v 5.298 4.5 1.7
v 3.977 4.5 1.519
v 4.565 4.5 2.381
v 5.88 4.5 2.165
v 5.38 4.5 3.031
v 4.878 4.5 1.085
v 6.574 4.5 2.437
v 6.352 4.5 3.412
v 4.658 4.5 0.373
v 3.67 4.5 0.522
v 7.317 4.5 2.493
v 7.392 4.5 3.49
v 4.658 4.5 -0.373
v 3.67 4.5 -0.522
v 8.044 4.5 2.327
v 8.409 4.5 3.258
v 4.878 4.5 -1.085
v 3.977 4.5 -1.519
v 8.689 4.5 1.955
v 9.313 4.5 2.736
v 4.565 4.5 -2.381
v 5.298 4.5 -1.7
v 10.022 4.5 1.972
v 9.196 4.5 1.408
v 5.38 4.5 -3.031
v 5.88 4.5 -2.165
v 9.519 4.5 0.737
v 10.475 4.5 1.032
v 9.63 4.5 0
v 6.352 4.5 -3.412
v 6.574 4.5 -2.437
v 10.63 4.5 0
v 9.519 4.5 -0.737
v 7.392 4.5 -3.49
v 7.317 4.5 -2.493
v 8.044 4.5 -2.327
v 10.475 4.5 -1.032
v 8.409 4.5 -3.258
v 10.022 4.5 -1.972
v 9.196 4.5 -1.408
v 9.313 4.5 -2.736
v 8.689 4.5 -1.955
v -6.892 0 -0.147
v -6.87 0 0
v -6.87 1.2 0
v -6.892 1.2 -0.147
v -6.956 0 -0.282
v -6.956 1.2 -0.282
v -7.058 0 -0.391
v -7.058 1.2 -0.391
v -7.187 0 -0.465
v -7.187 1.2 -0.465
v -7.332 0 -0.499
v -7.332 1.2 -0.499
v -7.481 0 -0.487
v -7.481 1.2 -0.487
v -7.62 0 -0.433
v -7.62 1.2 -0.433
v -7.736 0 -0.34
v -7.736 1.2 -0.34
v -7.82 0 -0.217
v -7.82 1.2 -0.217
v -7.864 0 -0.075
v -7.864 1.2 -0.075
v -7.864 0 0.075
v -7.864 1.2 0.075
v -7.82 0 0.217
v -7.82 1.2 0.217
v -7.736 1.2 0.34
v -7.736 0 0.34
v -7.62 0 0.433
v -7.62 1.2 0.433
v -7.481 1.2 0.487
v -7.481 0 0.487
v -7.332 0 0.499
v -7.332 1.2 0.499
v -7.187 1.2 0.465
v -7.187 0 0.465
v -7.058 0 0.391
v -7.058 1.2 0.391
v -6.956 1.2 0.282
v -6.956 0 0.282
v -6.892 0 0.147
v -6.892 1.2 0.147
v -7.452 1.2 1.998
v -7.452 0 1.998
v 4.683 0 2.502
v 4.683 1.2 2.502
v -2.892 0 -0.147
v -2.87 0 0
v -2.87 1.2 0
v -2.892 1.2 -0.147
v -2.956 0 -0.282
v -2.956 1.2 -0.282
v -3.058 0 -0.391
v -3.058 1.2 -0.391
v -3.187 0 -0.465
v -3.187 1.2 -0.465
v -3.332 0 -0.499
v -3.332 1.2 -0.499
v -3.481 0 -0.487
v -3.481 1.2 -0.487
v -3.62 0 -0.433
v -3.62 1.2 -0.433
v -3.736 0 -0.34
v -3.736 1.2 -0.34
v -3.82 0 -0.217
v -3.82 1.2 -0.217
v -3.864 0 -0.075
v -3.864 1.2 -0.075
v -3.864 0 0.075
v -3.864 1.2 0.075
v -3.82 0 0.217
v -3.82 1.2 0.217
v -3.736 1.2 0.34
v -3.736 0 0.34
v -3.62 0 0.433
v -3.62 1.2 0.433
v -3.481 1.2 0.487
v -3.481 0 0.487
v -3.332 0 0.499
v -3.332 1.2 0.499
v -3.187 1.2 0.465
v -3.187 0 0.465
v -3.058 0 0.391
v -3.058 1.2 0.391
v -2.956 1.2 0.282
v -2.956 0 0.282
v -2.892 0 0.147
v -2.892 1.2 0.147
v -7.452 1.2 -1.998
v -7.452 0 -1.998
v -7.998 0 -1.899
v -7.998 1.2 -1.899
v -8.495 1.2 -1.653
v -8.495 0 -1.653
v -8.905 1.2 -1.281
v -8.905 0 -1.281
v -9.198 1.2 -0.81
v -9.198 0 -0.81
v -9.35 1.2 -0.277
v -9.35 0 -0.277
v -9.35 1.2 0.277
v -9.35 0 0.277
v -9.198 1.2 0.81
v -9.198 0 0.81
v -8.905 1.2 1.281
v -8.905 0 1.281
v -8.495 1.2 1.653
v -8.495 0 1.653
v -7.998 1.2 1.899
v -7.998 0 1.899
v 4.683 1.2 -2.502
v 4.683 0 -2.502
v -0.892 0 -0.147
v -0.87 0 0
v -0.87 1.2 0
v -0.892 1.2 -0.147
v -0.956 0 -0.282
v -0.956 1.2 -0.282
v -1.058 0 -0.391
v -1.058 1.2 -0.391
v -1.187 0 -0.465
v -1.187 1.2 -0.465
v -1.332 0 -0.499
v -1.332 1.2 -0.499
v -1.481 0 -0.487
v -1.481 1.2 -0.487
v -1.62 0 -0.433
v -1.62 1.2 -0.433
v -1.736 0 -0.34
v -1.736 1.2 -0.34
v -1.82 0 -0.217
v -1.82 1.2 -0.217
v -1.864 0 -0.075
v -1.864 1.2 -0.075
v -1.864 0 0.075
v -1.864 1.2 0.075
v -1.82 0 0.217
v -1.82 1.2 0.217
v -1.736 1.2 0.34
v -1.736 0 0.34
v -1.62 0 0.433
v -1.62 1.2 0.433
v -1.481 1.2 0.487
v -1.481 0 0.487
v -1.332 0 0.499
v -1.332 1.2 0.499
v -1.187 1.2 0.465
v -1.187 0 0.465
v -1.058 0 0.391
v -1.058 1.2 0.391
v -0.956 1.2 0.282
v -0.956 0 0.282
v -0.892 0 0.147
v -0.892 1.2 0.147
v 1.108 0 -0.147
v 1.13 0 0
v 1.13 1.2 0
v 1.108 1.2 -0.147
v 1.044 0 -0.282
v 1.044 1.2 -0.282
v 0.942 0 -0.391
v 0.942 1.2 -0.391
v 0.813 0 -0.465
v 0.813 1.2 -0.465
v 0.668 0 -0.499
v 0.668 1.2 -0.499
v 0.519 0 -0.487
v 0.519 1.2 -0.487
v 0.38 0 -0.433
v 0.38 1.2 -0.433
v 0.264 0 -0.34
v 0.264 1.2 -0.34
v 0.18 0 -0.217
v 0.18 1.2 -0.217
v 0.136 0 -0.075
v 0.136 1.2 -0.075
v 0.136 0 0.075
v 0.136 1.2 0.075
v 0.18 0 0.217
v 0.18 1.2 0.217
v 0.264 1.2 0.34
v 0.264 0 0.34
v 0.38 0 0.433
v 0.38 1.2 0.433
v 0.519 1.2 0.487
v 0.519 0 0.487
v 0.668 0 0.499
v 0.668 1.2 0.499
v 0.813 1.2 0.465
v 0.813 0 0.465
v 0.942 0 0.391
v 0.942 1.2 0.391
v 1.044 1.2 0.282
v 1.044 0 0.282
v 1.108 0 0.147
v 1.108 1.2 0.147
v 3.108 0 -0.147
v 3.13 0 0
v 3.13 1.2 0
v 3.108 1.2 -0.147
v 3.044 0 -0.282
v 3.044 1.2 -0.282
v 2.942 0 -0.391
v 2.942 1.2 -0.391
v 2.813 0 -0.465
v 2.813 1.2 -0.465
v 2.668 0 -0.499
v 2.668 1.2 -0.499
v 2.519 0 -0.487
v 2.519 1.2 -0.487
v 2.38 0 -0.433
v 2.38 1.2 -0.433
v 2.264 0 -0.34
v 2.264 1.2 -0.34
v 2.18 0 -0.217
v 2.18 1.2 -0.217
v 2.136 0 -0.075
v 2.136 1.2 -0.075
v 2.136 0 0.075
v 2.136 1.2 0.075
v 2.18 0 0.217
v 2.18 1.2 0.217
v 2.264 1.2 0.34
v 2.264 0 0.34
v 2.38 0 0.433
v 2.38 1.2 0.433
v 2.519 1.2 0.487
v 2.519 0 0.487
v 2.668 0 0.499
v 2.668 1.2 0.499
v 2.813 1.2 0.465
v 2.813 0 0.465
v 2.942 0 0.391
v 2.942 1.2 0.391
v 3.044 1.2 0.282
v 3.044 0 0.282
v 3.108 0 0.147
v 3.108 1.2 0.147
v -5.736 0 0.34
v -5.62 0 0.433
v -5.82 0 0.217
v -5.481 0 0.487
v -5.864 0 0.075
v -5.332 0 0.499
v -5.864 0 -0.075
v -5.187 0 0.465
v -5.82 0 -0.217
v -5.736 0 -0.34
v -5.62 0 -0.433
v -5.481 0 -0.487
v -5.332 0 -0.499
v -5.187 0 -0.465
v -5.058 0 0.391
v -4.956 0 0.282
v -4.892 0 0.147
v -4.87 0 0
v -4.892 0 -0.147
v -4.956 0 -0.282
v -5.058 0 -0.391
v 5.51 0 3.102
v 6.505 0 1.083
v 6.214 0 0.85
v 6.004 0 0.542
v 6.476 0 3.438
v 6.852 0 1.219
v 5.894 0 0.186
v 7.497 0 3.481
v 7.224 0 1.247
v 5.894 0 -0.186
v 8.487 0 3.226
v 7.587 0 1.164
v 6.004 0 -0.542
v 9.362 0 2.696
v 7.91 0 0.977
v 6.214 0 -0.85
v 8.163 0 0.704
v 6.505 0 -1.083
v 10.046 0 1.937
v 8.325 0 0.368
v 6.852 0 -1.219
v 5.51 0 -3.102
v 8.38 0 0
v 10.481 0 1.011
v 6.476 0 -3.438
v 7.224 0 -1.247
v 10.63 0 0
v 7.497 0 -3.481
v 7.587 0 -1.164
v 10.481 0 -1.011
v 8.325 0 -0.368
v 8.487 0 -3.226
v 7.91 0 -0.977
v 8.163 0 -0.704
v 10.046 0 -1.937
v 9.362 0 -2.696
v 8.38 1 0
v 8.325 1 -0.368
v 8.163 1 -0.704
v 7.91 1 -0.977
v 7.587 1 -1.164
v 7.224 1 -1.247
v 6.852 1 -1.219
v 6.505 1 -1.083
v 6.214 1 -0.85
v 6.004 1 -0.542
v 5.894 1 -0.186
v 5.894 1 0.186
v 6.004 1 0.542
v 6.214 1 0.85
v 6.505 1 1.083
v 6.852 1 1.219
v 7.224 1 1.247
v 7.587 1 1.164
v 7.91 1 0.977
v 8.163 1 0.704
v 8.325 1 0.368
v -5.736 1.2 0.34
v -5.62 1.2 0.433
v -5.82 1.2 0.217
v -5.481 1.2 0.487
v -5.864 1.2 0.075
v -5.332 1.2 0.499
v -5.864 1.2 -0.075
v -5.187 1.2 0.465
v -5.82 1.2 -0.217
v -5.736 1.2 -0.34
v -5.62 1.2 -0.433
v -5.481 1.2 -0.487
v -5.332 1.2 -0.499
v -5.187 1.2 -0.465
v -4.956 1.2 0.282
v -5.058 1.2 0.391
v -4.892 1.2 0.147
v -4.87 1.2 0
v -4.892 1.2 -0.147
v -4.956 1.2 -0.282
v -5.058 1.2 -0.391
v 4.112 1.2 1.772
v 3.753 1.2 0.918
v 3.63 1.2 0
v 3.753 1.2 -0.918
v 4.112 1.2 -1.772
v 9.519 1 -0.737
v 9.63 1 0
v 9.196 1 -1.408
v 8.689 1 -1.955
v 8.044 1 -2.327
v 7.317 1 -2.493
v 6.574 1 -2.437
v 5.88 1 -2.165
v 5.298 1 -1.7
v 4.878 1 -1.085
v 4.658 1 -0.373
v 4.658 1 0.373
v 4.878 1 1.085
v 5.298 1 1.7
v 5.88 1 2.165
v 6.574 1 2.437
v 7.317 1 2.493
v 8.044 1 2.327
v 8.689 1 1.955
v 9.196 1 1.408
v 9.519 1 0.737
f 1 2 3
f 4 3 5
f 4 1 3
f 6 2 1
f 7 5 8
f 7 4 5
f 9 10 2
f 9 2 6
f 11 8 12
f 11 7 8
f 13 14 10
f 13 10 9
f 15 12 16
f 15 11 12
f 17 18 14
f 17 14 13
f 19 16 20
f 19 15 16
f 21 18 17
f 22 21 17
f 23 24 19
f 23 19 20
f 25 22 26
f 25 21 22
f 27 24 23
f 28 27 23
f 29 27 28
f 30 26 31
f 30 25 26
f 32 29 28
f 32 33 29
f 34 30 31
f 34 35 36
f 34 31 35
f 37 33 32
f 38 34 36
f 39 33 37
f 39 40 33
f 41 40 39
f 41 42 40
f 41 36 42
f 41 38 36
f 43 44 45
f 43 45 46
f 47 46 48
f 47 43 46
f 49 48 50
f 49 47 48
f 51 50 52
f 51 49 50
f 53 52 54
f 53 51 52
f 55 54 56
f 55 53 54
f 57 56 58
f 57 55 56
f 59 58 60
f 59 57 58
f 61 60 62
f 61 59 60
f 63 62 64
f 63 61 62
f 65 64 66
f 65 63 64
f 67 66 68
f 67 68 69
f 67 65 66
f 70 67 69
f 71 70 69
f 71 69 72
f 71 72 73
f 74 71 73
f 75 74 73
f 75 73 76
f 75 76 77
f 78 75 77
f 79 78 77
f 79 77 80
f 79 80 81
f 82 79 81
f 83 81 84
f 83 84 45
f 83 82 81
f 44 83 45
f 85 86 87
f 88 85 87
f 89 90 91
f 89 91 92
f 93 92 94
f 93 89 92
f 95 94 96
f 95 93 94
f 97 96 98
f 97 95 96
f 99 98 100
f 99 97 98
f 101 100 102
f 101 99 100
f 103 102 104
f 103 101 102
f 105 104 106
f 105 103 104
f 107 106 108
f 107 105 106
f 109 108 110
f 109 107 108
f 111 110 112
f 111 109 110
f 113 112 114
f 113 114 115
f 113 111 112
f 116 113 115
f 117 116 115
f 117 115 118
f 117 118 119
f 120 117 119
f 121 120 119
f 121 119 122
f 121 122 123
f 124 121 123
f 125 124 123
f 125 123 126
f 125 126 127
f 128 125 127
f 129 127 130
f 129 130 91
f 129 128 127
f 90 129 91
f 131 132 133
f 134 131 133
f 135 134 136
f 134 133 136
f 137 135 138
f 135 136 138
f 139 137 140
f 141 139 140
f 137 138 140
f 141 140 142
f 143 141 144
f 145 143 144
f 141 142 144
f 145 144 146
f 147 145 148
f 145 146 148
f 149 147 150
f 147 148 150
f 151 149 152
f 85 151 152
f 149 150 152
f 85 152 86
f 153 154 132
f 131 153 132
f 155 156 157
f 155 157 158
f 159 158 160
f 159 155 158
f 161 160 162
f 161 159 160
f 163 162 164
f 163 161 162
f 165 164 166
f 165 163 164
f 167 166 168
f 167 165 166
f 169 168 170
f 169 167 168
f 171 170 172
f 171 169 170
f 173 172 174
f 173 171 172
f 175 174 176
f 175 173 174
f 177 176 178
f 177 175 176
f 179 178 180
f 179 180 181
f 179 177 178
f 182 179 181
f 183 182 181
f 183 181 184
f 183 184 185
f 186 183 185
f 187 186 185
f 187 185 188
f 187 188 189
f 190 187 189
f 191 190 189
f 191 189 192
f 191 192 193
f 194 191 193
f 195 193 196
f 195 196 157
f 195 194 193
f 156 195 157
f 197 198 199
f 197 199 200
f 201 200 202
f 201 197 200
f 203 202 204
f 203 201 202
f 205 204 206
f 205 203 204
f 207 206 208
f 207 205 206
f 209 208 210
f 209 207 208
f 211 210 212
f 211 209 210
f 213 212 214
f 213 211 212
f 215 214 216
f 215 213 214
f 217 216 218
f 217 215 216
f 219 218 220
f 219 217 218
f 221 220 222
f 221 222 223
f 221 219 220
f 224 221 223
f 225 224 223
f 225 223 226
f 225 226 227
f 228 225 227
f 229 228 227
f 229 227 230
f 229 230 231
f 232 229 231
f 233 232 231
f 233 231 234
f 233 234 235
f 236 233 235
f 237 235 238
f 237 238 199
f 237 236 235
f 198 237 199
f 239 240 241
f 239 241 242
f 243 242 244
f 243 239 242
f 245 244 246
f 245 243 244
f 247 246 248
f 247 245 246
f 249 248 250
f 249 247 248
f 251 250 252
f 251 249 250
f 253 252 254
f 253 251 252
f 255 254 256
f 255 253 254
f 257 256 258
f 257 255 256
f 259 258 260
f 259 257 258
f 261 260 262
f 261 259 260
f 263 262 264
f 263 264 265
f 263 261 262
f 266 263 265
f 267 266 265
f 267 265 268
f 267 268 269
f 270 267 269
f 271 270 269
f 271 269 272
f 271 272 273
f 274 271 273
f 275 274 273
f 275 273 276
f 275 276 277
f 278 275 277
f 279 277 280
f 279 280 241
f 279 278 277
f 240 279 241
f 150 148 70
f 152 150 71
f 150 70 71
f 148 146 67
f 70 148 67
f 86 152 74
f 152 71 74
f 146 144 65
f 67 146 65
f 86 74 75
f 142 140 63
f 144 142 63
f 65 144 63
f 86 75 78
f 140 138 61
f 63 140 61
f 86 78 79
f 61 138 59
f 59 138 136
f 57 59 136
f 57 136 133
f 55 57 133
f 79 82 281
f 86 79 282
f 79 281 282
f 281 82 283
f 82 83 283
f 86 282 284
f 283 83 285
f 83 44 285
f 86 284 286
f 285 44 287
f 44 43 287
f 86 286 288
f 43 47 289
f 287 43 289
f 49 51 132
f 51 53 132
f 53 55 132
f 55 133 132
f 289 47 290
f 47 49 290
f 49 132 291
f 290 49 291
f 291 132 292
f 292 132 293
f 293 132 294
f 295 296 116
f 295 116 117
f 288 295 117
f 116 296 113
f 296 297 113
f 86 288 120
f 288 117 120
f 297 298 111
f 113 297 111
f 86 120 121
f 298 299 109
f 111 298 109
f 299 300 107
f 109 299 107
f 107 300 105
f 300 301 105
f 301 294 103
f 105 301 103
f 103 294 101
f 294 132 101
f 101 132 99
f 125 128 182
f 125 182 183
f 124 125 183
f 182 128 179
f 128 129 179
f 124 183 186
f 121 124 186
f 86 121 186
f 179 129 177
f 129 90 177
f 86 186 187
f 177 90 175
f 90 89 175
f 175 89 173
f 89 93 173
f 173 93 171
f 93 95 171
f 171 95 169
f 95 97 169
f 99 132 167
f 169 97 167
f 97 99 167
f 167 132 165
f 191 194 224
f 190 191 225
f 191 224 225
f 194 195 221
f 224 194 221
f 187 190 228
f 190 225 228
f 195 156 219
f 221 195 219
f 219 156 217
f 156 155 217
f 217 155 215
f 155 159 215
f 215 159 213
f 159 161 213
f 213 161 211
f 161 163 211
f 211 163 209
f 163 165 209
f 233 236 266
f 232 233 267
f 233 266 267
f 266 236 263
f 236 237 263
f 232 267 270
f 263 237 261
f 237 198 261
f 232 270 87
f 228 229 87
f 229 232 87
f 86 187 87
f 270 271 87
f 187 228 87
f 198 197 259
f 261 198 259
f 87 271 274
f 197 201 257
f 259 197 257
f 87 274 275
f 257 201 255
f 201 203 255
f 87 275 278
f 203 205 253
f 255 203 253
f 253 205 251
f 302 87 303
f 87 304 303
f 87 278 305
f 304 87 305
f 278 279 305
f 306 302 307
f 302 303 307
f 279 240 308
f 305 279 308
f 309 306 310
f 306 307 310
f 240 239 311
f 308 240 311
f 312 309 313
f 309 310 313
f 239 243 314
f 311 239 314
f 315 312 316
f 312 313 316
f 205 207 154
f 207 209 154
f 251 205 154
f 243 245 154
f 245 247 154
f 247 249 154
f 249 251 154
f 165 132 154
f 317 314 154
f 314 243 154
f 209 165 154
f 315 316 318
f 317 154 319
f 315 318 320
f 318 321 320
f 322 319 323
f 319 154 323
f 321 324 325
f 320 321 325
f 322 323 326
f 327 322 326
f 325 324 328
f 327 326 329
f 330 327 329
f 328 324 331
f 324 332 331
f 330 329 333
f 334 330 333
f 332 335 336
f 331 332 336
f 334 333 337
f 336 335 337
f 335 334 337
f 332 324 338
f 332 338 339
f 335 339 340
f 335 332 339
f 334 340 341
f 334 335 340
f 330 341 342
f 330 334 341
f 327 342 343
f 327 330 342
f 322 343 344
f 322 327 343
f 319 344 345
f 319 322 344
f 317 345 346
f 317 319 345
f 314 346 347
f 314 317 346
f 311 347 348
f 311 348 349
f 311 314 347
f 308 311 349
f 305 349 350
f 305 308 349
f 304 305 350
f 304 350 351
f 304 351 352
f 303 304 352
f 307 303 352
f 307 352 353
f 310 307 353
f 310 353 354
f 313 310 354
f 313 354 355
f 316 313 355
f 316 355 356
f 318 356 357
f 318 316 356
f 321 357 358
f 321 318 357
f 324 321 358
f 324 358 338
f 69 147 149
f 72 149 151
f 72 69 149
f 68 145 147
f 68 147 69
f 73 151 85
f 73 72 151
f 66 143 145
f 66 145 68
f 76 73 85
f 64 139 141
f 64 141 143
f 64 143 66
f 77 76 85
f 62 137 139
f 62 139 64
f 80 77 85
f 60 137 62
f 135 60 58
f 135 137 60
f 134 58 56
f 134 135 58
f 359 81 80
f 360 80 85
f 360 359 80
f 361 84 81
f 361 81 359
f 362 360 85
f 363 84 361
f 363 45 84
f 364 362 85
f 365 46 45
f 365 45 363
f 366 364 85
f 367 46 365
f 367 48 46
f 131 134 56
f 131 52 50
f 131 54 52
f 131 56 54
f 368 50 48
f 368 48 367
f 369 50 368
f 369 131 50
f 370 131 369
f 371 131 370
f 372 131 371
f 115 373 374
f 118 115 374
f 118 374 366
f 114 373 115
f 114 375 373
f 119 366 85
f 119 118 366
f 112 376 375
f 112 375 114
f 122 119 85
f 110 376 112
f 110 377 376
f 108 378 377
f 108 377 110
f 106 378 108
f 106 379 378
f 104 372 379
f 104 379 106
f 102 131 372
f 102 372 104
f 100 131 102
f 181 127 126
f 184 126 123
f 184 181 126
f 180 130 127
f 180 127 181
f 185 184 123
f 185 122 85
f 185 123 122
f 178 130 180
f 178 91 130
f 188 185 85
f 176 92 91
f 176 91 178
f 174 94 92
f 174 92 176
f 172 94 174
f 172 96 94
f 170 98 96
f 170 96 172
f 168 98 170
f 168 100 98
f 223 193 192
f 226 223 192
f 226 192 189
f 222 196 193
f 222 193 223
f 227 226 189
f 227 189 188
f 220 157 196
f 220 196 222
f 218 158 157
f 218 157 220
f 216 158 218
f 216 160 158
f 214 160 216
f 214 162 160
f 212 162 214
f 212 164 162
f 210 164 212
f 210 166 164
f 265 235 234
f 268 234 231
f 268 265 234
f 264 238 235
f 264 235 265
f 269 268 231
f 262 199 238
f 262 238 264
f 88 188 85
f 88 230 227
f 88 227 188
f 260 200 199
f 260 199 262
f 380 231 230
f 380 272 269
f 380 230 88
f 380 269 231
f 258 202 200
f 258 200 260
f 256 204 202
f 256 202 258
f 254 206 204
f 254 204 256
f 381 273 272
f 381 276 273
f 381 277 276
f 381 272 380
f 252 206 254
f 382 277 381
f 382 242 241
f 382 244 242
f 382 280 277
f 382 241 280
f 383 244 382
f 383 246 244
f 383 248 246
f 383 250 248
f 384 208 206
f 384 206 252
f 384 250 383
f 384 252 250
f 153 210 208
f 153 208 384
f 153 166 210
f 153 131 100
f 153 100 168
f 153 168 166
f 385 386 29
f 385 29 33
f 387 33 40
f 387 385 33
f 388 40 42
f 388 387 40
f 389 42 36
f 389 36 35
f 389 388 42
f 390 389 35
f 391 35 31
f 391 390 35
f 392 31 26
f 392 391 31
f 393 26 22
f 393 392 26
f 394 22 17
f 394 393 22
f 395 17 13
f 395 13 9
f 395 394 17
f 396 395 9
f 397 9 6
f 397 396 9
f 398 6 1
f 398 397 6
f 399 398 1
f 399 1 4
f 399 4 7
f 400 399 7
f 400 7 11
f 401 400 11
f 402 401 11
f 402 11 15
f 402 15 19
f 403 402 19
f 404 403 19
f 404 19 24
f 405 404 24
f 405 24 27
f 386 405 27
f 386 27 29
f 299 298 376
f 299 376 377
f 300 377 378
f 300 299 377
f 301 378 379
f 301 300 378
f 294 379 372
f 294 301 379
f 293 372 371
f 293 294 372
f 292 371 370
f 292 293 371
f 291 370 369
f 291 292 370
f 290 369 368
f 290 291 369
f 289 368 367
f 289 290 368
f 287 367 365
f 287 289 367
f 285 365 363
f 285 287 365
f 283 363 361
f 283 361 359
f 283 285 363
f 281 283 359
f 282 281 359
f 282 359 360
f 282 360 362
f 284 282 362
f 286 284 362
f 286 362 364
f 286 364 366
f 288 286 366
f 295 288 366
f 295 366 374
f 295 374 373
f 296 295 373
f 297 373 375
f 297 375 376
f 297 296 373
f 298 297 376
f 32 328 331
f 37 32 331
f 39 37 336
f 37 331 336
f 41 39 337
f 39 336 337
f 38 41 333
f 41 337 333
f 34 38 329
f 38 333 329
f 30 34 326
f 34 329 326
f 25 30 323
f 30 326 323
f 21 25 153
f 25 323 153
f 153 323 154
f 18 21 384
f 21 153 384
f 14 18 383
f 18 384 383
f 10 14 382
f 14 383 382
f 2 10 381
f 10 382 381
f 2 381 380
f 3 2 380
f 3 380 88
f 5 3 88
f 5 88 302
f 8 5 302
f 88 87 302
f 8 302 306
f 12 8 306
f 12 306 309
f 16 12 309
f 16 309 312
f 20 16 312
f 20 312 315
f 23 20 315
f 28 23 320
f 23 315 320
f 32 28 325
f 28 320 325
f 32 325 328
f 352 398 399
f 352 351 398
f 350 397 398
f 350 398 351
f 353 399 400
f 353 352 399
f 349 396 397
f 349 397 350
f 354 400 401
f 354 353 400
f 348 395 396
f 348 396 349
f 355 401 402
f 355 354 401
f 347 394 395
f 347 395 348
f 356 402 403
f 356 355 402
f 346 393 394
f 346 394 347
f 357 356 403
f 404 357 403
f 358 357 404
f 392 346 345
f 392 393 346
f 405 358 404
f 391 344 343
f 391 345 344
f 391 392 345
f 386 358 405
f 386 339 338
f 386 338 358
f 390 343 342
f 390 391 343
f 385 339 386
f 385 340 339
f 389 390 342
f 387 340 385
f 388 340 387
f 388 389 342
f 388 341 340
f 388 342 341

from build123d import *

# Parameters (mm, degrees)
SKETCH_1_R          = 0.5
EXTRUDE_1_DEPTH     = 1.2
SKETCH_1_3_R        = 3.5
SKETCH_1_3_R_2      = 2.5
EXTRUDE_2_DEPTH     = 4.5
SKETCH_1_4_R        = 2.5
EXTRUDE_3_DEPTH     = 1
SKETCH_3_R          = 1.25
CUT_EXTRUDE_1_DEPTH = 1


with BuildPart() as part:
    # 草图1 → 凸台-拉伸1 (new body)
    with BuildSketch(Plane(origin=(0, 0, 0), x_dir=(1, 0, 0), z_dir=(0, 1, 0))):
        with BuildLine():
            Line((4.682566803, 2.501585477), (-7.452442074, 1.998282013))
            ThreePointArc((-7.452442074, 1.998282013), (-9.369562674, 0), (-7.452442074, -1.998282013))
            Line((-7.452442074, -1.998282013), (4.682566803, -2.501585477))
            ThreePointArc((4.682566803, -2.501585477), (3.630437326, 0), (4.682566803, 2.501585477))
        make_face()
        with Locations((-7.369562674, 0)):
            Circle(SKETCH_1_R, mode=Mode.SUBTRACT)
        with Locations((-5.369562674, 0)):
            Circle(SKETCH_1_R, mode=Mode.SUBTRACT)
        with Locations((-3.369562674, 0)):
            Circle(SKETCH_1_R, mode=Mode.SUBTRACT)
        with Locations((-1.369562674, 0)):
            Circle(SKETCH_1_R, mode=Mode.SUBTRACT)
        with Locations((0.630437326, 0)):
            Circle(SKETCH_1_R, mode=Mode.SUBTRACT)
        with Locations((2.630437326, 0)):
            Circle(SKETCH_1_R, mode=Mode.SUBTRACT)
    extrude(amount=EXTRUDE_1_DEPTH)

    # 草图1<3> → 凸台-拉伸2 (add)
    with BuildSketch(Plane(origin=(0, 0, 0), x_dir=(1, 0, 0), z_dir=(0, 1, 0))):
        with Locations((7.130437326, 0)):
            Circle(SKETCH_1_3_R)
        with Locations((7.130437326, 0)):
            Circle(SKETCH_1_3_R_2, mode=Mode.SUBTRACT)
    extrude(amount=EXTRUDE_2_DEPTH)

    # 草图1<4> → 凸台-拉伸3 (add)
    with BuildSketch(Plane(origin=(0, 0, 0), x_dir=(1, 0, 0), z_dir=(0, 1, 0))):
        with Locations((7.130437326, 0)):
            Circle(SKETCH_1_4_R)
    extrude(amount=EXTRUDE_3_DEPTH)

    # 草图3 → 切除-拉伸1 (cut)
    with BuildSketch(Plane(origin=(0, 0, 0), x_dir=(1, 0, 0), z_dir=(0, 1, 0))):
        with Locations((7.130437326, 0)):
            Circle(SKETCH_3_R)
    extrude(amount=CUT_EXTRUDE_1_DEPTH, mode=Mode.SUBTRACT)


solid = part.part
